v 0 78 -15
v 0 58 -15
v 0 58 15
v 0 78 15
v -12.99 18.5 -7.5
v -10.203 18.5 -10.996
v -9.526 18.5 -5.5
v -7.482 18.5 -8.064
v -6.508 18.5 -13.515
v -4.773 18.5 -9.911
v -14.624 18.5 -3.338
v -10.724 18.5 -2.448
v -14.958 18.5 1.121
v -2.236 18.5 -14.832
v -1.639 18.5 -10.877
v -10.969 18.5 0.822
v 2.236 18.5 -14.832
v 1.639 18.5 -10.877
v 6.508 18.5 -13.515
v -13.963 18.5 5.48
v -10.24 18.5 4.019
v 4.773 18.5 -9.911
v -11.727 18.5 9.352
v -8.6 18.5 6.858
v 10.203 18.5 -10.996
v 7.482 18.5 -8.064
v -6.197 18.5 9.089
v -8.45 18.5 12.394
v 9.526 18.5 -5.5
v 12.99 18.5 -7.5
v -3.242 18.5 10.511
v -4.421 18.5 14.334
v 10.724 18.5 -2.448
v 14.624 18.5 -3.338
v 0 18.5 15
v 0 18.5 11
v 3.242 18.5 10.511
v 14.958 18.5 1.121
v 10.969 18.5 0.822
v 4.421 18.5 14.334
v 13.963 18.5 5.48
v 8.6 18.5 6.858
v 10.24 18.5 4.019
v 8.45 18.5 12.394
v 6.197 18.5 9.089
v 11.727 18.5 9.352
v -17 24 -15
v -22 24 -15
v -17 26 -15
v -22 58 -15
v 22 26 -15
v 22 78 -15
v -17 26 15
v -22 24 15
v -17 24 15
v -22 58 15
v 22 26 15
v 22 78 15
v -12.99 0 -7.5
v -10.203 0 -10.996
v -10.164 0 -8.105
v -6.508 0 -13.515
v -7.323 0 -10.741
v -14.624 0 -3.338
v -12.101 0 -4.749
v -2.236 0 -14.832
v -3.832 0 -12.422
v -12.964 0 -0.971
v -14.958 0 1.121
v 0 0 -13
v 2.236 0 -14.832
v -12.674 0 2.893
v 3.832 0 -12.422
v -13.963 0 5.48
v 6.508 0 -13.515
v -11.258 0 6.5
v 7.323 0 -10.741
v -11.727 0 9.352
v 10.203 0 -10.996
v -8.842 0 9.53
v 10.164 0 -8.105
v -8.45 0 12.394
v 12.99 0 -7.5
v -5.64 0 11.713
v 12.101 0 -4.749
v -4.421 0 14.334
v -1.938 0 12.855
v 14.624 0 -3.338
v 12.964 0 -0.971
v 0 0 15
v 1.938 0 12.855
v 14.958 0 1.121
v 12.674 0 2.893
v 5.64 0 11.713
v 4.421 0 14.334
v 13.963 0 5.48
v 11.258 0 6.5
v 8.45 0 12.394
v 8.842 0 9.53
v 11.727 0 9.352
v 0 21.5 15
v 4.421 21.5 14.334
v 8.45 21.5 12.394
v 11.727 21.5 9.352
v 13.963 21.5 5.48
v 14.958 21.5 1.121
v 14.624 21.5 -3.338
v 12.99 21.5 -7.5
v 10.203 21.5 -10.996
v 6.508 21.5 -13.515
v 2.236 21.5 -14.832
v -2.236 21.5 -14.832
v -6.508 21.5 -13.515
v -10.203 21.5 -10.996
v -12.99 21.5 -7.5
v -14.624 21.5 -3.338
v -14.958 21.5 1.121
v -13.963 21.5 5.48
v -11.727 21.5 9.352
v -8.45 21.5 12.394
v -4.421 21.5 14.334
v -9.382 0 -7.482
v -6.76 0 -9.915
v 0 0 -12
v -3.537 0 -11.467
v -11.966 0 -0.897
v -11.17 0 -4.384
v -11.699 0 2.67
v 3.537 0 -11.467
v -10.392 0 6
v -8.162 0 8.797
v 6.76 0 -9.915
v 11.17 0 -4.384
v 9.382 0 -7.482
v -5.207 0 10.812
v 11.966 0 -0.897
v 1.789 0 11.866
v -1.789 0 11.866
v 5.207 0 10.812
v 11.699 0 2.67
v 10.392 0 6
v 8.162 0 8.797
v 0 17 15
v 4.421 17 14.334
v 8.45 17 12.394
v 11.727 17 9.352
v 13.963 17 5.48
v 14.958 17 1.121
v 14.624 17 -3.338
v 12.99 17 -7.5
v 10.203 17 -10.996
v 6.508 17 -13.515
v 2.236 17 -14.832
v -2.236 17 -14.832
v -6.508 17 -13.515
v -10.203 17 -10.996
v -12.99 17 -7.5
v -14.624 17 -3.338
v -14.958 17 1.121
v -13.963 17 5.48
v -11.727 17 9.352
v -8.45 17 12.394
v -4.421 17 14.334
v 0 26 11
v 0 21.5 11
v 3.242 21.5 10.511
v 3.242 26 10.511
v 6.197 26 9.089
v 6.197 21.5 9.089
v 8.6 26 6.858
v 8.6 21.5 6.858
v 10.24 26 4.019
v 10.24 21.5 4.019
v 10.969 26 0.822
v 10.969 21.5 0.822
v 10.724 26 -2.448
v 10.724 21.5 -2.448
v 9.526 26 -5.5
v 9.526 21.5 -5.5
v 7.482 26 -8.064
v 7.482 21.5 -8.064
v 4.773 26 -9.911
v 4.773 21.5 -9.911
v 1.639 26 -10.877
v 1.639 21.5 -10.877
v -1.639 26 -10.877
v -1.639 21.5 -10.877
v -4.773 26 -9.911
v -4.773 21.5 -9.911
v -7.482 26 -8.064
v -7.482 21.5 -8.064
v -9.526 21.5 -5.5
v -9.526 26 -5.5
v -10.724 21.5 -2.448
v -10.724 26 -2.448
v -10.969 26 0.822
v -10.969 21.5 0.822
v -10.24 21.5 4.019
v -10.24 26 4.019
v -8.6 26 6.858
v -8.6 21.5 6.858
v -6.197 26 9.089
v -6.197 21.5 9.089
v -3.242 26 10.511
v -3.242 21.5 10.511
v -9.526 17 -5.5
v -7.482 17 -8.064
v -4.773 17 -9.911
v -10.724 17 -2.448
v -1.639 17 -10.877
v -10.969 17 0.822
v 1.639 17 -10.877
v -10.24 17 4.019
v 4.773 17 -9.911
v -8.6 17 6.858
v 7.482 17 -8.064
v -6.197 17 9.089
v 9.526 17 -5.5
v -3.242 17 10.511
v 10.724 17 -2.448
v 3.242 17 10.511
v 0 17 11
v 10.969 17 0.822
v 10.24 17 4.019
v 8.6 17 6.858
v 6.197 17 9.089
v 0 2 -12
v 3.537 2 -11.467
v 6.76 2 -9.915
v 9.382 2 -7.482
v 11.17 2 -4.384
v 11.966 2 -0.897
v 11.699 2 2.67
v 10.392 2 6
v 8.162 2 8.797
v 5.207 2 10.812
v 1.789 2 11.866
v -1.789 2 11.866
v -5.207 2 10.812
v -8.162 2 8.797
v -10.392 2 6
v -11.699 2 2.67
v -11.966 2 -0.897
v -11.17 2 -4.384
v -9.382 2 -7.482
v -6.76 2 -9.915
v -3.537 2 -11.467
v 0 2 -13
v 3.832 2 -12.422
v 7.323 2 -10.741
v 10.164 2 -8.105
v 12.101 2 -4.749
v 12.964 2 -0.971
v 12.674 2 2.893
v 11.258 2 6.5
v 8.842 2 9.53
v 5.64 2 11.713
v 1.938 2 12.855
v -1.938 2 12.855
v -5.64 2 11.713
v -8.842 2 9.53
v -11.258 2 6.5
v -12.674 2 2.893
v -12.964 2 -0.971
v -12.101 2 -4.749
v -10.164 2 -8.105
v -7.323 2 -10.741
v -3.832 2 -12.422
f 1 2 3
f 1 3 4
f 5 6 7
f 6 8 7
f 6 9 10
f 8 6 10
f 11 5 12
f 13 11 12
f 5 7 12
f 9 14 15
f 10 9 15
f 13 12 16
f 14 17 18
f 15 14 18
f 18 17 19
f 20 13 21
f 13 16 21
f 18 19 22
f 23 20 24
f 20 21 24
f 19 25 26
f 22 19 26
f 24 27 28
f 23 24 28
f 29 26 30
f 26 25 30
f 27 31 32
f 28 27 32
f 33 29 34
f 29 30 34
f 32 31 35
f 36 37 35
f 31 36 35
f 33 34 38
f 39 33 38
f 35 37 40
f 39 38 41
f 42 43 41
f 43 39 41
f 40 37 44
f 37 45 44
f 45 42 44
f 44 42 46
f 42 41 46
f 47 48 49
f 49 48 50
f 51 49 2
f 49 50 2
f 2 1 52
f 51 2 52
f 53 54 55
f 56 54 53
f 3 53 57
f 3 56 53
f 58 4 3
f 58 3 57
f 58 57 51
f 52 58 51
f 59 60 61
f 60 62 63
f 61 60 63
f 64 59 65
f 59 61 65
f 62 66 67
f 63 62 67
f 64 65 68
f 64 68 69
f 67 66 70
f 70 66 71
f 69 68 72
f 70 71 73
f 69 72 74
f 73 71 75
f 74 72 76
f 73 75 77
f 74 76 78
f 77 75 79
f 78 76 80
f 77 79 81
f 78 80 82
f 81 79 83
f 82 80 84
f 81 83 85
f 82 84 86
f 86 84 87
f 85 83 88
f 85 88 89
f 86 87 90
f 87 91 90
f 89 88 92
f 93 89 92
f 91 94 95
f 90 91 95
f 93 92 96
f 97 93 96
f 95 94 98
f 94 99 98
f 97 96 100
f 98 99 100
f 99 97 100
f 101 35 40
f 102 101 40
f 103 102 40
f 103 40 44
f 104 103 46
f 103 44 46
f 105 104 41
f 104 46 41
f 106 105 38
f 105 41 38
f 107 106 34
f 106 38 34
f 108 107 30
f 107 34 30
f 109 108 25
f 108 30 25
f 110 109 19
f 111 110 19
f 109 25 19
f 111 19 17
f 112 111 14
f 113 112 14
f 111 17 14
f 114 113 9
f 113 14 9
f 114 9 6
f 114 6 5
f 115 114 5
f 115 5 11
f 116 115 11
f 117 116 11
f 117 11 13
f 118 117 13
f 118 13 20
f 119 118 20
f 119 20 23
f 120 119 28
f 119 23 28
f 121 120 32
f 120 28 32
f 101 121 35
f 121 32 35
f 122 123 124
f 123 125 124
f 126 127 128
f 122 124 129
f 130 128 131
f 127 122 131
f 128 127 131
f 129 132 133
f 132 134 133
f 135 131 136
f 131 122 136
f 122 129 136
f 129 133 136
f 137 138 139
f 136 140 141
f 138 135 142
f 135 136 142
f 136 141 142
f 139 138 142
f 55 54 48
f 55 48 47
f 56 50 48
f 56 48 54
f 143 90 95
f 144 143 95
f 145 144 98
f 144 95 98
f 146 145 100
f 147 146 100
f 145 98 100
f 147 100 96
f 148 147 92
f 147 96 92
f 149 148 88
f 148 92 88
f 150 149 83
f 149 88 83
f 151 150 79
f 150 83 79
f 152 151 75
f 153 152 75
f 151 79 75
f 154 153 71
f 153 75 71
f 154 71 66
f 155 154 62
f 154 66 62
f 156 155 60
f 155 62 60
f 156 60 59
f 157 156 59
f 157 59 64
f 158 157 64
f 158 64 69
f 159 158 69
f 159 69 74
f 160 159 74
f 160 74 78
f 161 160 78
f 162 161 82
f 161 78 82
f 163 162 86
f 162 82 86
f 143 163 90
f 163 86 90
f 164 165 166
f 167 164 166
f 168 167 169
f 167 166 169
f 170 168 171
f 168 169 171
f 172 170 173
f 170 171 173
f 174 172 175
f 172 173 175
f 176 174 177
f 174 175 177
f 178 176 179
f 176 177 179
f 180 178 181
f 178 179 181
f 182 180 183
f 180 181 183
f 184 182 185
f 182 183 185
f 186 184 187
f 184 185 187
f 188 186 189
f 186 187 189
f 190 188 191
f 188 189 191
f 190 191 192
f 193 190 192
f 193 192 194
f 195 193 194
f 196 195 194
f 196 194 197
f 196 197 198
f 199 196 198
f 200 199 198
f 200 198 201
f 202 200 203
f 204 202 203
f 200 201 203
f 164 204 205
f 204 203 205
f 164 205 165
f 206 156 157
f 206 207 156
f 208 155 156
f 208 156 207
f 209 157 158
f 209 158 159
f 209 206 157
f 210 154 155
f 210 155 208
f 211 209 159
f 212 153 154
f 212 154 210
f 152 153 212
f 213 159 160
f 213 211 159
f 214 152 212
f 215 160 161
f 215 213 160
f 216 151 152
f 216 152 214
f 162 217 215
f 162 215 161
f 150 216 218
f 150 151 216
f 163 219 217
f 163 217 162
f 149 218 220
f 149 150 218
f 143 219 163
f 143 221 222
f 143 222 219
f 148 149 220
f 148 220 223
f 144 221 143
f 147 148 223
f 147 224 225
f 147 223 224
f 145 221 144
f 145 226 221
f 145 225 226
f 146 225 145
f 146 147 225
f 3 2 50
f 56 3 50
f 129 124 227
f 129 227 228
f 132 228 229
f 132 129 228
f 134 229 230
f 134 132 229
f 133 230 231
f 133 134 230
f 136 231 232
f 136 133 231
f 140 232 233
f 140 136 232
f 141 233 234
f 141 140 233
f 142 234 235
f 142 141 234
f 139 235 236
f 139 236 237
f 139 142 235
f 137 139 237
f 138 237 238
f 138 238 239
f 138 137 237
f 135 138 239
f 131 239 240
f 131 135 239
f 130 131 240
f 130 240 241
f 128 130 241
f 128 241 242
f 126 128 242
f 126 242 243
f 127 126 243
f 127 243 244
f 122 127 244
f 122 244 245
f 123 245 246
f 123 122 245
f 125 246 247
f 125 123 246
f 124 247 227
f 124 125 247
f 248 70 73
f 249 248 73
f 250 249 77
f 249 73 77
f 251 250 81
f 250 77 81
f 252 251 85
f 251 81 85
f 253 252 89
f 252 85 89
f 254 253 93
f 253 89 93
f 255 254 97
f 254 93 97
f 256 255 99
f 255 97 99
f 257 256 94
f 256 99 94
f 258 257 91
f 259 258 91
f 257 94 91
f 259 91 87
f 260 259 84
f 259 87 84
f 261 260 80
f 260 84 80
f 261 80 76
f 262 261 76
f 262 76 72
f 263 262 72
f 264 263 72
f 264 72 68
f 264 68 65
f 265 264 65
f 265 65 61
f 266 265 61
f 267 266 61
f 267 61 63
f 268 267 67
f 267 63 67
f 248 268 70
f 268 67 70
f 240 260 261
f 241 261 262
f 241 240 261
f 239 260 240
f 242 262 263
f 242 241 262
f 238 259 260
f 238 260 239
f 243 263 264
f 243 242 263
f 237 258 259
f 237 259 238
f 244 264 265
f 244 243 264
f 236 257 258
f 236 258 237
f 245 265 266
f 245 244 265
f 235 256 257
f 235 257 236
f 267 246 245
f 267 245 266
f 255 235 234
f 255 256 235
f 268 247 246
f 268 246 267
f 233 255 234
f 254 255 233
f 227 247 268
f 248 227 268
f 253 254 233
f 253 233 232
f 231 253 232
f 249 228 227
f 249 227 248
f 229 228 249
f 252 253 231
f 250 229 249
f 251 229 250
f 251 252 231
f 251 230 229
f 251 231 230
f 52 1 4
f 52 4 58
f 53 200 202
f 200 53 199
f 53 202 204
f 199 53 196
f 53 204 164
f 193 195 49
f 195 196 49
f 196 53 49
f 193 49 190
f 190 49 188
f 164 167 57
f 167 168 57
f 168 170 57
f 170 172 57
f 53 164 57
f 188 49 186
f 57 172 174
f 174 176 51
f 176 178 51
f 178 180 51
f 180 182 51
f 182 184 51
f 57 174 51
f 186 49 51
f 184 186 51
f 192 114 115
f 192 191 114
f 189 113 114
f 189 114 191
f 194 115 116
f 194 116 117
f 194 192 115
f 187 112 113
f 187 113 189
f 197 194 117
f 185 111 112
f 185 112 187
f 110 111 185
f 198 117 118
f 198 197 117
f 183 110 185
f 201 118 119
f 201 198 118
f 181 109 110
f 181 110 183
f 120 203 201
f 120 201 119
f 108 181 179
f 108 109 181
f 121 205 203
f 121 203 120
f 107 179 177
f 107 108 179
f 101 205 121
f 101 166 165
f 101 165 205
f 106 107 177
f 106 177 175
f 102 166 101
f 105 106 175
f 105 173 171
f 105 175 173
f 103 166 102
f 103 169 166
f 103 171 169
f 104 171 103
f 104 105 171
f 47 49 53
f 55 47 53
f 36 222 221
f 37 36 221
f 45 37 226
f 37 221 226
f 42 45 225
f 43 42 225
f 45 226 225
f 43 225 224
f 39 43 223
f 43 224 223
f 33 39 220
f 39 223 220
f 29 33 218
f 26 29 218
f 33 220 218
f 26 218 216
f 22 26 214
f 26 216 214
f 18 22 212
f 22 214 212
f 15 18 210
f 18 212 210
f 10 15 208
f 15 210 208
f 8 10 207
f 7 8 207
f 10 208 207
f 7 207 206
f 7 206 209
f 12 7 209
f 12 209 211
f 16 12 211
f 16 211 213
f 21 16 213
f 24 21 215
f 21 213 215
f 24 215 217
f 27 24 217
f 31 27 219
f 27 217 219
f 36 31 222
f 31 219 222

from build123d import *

# Parameters (mm, degrees)
SKETCH_1_R          = 15
EXTRUDE_1_DEPTH     = 17
SKETCH_2_R          = 11
EXTRUDE_2_DEPTH     = 1.5
SKETCH_3_R          = 15
EXTRUDE_3_DEPTH     = 3
SKETCH_4_R          = 11
EXTRUDE_4_DEPTH     = 4.5
SKETCH_6_W          = 44
SKETCH_6_H          = 30
EXTRUDE_6_DEPTH     = 52
SKETCH_7_W          = 5
SKETCH_7_H          = 30
EXTRUDE_7_DEPTH     = 2
SKETCH_8_W          = 22
SKETCH_8_H          = 20
CUT_EXTRUDE_1_DEPTH = 87.417590802
SKETCH_9_R          = 13
SKETCH_9_R_2        = 12
CUT_EXTRUDE_2_DEPTH = 2


with BuildPart() as part:
    # 草圖1 → 伸長1 (new body)
    with BuildSketch(Plane(origin=(0, 0, 0), x_dir=(1, 0, 0), z_dir=(0, 1, 0))):
        with Locations(Location((0, 0, 0), (0, 0, 270))):
            Circle(SKETCH_1_R)
    extrude(amount=EXTRUDE_1_DEPTH)

    # 草圖2 → 伸長2 (add)
    with BuildSketch(Plane(origin=(0, 17, 0), x_dir=(1, 0, 0), z_dir=(0, 1, 0))):
        with Locations(Location((0, 0, 0), (0, 0, 270))):
            Circle(SKETCH_2_R)
    extrude(amount=EXTRUDE_2_DEPTH)

    # 草圖3 → 伸長3 (add)
    with BuildSketch(Plane(origin=(0, 18.5, 0), x_dir=(1, 0, 0), z_dir=(0, 1, 0))):
        with Locations(Location((0, 0, 0), (0, 0, 270))):
            Circle(SKETCH_3_R)
    extrude(amount=EXTRUDE_3_DEPTH)

    # 草圖4 → 伸長4 (add)
    with BuildSketch(Plane(origin=(0, 21.5, 0), x_dir=(1, 0, 0), z_dir=(0, 1, 0))):
        with Locations(Location((0, 0, 0), (0, 0, 270))):
            Circle(SKETCH_4_R)
    extrude(amount=EXTRUDE_4_DEPTH)

    # 草圖6 → 伸長6 (add)
    with BuildSketch(Plane(origin=(0, 26, 0), x_dir=(1, 0, 0), z_dir=(0, 1, 0))):
        Rectangle(SKETCH_6_W, SKETCH_6_H)
    extrude(amount=EXTRUDE_6_DEPTH)

    # 草圖7 → 伸長7 (add)
    with BuildSketch(Plane.XZ.offset(-26)):
        with Locations((-19.5, 0)):
            Rectangle(SKETCH_7_W, SKETCH_7_H)
    extrude(amount=EXTRUDE_7_DEPTH)

    # 草圖8 → 除料-伸長1 (cut, through all)
    with BuildSketch(Plane(origin=(0, 0, -15), x_dir=(-1, 0, 0), z_dir=(0, 0, -1))):
        with Locations((11, 68)):
            Rectangle(SKETCH_8_W, SKETCH_8_H)
    extrude(amount=-CUT_EXTRUDE_1_DEPTH, mode=Mode.SUBTRACT)

    # 草圖9 → 除料-伸長2 (cut)
    with BuildSketch(Plane.XZ):
        with Locations(Location((0, 0, 0), (0, 0, 270))):
            Circle(SKETCH_9_R)
        with Locations(Location((0, 0, 0), (0, 0, 270))):
            Circle(SKETCH_9_R_2, mode=Mode.SUBTRACT)
    extrude(amount=-CUT_EXTRUDE_2_DEPTH, mode=Mode.SUBTRACT)


solid = part.part
